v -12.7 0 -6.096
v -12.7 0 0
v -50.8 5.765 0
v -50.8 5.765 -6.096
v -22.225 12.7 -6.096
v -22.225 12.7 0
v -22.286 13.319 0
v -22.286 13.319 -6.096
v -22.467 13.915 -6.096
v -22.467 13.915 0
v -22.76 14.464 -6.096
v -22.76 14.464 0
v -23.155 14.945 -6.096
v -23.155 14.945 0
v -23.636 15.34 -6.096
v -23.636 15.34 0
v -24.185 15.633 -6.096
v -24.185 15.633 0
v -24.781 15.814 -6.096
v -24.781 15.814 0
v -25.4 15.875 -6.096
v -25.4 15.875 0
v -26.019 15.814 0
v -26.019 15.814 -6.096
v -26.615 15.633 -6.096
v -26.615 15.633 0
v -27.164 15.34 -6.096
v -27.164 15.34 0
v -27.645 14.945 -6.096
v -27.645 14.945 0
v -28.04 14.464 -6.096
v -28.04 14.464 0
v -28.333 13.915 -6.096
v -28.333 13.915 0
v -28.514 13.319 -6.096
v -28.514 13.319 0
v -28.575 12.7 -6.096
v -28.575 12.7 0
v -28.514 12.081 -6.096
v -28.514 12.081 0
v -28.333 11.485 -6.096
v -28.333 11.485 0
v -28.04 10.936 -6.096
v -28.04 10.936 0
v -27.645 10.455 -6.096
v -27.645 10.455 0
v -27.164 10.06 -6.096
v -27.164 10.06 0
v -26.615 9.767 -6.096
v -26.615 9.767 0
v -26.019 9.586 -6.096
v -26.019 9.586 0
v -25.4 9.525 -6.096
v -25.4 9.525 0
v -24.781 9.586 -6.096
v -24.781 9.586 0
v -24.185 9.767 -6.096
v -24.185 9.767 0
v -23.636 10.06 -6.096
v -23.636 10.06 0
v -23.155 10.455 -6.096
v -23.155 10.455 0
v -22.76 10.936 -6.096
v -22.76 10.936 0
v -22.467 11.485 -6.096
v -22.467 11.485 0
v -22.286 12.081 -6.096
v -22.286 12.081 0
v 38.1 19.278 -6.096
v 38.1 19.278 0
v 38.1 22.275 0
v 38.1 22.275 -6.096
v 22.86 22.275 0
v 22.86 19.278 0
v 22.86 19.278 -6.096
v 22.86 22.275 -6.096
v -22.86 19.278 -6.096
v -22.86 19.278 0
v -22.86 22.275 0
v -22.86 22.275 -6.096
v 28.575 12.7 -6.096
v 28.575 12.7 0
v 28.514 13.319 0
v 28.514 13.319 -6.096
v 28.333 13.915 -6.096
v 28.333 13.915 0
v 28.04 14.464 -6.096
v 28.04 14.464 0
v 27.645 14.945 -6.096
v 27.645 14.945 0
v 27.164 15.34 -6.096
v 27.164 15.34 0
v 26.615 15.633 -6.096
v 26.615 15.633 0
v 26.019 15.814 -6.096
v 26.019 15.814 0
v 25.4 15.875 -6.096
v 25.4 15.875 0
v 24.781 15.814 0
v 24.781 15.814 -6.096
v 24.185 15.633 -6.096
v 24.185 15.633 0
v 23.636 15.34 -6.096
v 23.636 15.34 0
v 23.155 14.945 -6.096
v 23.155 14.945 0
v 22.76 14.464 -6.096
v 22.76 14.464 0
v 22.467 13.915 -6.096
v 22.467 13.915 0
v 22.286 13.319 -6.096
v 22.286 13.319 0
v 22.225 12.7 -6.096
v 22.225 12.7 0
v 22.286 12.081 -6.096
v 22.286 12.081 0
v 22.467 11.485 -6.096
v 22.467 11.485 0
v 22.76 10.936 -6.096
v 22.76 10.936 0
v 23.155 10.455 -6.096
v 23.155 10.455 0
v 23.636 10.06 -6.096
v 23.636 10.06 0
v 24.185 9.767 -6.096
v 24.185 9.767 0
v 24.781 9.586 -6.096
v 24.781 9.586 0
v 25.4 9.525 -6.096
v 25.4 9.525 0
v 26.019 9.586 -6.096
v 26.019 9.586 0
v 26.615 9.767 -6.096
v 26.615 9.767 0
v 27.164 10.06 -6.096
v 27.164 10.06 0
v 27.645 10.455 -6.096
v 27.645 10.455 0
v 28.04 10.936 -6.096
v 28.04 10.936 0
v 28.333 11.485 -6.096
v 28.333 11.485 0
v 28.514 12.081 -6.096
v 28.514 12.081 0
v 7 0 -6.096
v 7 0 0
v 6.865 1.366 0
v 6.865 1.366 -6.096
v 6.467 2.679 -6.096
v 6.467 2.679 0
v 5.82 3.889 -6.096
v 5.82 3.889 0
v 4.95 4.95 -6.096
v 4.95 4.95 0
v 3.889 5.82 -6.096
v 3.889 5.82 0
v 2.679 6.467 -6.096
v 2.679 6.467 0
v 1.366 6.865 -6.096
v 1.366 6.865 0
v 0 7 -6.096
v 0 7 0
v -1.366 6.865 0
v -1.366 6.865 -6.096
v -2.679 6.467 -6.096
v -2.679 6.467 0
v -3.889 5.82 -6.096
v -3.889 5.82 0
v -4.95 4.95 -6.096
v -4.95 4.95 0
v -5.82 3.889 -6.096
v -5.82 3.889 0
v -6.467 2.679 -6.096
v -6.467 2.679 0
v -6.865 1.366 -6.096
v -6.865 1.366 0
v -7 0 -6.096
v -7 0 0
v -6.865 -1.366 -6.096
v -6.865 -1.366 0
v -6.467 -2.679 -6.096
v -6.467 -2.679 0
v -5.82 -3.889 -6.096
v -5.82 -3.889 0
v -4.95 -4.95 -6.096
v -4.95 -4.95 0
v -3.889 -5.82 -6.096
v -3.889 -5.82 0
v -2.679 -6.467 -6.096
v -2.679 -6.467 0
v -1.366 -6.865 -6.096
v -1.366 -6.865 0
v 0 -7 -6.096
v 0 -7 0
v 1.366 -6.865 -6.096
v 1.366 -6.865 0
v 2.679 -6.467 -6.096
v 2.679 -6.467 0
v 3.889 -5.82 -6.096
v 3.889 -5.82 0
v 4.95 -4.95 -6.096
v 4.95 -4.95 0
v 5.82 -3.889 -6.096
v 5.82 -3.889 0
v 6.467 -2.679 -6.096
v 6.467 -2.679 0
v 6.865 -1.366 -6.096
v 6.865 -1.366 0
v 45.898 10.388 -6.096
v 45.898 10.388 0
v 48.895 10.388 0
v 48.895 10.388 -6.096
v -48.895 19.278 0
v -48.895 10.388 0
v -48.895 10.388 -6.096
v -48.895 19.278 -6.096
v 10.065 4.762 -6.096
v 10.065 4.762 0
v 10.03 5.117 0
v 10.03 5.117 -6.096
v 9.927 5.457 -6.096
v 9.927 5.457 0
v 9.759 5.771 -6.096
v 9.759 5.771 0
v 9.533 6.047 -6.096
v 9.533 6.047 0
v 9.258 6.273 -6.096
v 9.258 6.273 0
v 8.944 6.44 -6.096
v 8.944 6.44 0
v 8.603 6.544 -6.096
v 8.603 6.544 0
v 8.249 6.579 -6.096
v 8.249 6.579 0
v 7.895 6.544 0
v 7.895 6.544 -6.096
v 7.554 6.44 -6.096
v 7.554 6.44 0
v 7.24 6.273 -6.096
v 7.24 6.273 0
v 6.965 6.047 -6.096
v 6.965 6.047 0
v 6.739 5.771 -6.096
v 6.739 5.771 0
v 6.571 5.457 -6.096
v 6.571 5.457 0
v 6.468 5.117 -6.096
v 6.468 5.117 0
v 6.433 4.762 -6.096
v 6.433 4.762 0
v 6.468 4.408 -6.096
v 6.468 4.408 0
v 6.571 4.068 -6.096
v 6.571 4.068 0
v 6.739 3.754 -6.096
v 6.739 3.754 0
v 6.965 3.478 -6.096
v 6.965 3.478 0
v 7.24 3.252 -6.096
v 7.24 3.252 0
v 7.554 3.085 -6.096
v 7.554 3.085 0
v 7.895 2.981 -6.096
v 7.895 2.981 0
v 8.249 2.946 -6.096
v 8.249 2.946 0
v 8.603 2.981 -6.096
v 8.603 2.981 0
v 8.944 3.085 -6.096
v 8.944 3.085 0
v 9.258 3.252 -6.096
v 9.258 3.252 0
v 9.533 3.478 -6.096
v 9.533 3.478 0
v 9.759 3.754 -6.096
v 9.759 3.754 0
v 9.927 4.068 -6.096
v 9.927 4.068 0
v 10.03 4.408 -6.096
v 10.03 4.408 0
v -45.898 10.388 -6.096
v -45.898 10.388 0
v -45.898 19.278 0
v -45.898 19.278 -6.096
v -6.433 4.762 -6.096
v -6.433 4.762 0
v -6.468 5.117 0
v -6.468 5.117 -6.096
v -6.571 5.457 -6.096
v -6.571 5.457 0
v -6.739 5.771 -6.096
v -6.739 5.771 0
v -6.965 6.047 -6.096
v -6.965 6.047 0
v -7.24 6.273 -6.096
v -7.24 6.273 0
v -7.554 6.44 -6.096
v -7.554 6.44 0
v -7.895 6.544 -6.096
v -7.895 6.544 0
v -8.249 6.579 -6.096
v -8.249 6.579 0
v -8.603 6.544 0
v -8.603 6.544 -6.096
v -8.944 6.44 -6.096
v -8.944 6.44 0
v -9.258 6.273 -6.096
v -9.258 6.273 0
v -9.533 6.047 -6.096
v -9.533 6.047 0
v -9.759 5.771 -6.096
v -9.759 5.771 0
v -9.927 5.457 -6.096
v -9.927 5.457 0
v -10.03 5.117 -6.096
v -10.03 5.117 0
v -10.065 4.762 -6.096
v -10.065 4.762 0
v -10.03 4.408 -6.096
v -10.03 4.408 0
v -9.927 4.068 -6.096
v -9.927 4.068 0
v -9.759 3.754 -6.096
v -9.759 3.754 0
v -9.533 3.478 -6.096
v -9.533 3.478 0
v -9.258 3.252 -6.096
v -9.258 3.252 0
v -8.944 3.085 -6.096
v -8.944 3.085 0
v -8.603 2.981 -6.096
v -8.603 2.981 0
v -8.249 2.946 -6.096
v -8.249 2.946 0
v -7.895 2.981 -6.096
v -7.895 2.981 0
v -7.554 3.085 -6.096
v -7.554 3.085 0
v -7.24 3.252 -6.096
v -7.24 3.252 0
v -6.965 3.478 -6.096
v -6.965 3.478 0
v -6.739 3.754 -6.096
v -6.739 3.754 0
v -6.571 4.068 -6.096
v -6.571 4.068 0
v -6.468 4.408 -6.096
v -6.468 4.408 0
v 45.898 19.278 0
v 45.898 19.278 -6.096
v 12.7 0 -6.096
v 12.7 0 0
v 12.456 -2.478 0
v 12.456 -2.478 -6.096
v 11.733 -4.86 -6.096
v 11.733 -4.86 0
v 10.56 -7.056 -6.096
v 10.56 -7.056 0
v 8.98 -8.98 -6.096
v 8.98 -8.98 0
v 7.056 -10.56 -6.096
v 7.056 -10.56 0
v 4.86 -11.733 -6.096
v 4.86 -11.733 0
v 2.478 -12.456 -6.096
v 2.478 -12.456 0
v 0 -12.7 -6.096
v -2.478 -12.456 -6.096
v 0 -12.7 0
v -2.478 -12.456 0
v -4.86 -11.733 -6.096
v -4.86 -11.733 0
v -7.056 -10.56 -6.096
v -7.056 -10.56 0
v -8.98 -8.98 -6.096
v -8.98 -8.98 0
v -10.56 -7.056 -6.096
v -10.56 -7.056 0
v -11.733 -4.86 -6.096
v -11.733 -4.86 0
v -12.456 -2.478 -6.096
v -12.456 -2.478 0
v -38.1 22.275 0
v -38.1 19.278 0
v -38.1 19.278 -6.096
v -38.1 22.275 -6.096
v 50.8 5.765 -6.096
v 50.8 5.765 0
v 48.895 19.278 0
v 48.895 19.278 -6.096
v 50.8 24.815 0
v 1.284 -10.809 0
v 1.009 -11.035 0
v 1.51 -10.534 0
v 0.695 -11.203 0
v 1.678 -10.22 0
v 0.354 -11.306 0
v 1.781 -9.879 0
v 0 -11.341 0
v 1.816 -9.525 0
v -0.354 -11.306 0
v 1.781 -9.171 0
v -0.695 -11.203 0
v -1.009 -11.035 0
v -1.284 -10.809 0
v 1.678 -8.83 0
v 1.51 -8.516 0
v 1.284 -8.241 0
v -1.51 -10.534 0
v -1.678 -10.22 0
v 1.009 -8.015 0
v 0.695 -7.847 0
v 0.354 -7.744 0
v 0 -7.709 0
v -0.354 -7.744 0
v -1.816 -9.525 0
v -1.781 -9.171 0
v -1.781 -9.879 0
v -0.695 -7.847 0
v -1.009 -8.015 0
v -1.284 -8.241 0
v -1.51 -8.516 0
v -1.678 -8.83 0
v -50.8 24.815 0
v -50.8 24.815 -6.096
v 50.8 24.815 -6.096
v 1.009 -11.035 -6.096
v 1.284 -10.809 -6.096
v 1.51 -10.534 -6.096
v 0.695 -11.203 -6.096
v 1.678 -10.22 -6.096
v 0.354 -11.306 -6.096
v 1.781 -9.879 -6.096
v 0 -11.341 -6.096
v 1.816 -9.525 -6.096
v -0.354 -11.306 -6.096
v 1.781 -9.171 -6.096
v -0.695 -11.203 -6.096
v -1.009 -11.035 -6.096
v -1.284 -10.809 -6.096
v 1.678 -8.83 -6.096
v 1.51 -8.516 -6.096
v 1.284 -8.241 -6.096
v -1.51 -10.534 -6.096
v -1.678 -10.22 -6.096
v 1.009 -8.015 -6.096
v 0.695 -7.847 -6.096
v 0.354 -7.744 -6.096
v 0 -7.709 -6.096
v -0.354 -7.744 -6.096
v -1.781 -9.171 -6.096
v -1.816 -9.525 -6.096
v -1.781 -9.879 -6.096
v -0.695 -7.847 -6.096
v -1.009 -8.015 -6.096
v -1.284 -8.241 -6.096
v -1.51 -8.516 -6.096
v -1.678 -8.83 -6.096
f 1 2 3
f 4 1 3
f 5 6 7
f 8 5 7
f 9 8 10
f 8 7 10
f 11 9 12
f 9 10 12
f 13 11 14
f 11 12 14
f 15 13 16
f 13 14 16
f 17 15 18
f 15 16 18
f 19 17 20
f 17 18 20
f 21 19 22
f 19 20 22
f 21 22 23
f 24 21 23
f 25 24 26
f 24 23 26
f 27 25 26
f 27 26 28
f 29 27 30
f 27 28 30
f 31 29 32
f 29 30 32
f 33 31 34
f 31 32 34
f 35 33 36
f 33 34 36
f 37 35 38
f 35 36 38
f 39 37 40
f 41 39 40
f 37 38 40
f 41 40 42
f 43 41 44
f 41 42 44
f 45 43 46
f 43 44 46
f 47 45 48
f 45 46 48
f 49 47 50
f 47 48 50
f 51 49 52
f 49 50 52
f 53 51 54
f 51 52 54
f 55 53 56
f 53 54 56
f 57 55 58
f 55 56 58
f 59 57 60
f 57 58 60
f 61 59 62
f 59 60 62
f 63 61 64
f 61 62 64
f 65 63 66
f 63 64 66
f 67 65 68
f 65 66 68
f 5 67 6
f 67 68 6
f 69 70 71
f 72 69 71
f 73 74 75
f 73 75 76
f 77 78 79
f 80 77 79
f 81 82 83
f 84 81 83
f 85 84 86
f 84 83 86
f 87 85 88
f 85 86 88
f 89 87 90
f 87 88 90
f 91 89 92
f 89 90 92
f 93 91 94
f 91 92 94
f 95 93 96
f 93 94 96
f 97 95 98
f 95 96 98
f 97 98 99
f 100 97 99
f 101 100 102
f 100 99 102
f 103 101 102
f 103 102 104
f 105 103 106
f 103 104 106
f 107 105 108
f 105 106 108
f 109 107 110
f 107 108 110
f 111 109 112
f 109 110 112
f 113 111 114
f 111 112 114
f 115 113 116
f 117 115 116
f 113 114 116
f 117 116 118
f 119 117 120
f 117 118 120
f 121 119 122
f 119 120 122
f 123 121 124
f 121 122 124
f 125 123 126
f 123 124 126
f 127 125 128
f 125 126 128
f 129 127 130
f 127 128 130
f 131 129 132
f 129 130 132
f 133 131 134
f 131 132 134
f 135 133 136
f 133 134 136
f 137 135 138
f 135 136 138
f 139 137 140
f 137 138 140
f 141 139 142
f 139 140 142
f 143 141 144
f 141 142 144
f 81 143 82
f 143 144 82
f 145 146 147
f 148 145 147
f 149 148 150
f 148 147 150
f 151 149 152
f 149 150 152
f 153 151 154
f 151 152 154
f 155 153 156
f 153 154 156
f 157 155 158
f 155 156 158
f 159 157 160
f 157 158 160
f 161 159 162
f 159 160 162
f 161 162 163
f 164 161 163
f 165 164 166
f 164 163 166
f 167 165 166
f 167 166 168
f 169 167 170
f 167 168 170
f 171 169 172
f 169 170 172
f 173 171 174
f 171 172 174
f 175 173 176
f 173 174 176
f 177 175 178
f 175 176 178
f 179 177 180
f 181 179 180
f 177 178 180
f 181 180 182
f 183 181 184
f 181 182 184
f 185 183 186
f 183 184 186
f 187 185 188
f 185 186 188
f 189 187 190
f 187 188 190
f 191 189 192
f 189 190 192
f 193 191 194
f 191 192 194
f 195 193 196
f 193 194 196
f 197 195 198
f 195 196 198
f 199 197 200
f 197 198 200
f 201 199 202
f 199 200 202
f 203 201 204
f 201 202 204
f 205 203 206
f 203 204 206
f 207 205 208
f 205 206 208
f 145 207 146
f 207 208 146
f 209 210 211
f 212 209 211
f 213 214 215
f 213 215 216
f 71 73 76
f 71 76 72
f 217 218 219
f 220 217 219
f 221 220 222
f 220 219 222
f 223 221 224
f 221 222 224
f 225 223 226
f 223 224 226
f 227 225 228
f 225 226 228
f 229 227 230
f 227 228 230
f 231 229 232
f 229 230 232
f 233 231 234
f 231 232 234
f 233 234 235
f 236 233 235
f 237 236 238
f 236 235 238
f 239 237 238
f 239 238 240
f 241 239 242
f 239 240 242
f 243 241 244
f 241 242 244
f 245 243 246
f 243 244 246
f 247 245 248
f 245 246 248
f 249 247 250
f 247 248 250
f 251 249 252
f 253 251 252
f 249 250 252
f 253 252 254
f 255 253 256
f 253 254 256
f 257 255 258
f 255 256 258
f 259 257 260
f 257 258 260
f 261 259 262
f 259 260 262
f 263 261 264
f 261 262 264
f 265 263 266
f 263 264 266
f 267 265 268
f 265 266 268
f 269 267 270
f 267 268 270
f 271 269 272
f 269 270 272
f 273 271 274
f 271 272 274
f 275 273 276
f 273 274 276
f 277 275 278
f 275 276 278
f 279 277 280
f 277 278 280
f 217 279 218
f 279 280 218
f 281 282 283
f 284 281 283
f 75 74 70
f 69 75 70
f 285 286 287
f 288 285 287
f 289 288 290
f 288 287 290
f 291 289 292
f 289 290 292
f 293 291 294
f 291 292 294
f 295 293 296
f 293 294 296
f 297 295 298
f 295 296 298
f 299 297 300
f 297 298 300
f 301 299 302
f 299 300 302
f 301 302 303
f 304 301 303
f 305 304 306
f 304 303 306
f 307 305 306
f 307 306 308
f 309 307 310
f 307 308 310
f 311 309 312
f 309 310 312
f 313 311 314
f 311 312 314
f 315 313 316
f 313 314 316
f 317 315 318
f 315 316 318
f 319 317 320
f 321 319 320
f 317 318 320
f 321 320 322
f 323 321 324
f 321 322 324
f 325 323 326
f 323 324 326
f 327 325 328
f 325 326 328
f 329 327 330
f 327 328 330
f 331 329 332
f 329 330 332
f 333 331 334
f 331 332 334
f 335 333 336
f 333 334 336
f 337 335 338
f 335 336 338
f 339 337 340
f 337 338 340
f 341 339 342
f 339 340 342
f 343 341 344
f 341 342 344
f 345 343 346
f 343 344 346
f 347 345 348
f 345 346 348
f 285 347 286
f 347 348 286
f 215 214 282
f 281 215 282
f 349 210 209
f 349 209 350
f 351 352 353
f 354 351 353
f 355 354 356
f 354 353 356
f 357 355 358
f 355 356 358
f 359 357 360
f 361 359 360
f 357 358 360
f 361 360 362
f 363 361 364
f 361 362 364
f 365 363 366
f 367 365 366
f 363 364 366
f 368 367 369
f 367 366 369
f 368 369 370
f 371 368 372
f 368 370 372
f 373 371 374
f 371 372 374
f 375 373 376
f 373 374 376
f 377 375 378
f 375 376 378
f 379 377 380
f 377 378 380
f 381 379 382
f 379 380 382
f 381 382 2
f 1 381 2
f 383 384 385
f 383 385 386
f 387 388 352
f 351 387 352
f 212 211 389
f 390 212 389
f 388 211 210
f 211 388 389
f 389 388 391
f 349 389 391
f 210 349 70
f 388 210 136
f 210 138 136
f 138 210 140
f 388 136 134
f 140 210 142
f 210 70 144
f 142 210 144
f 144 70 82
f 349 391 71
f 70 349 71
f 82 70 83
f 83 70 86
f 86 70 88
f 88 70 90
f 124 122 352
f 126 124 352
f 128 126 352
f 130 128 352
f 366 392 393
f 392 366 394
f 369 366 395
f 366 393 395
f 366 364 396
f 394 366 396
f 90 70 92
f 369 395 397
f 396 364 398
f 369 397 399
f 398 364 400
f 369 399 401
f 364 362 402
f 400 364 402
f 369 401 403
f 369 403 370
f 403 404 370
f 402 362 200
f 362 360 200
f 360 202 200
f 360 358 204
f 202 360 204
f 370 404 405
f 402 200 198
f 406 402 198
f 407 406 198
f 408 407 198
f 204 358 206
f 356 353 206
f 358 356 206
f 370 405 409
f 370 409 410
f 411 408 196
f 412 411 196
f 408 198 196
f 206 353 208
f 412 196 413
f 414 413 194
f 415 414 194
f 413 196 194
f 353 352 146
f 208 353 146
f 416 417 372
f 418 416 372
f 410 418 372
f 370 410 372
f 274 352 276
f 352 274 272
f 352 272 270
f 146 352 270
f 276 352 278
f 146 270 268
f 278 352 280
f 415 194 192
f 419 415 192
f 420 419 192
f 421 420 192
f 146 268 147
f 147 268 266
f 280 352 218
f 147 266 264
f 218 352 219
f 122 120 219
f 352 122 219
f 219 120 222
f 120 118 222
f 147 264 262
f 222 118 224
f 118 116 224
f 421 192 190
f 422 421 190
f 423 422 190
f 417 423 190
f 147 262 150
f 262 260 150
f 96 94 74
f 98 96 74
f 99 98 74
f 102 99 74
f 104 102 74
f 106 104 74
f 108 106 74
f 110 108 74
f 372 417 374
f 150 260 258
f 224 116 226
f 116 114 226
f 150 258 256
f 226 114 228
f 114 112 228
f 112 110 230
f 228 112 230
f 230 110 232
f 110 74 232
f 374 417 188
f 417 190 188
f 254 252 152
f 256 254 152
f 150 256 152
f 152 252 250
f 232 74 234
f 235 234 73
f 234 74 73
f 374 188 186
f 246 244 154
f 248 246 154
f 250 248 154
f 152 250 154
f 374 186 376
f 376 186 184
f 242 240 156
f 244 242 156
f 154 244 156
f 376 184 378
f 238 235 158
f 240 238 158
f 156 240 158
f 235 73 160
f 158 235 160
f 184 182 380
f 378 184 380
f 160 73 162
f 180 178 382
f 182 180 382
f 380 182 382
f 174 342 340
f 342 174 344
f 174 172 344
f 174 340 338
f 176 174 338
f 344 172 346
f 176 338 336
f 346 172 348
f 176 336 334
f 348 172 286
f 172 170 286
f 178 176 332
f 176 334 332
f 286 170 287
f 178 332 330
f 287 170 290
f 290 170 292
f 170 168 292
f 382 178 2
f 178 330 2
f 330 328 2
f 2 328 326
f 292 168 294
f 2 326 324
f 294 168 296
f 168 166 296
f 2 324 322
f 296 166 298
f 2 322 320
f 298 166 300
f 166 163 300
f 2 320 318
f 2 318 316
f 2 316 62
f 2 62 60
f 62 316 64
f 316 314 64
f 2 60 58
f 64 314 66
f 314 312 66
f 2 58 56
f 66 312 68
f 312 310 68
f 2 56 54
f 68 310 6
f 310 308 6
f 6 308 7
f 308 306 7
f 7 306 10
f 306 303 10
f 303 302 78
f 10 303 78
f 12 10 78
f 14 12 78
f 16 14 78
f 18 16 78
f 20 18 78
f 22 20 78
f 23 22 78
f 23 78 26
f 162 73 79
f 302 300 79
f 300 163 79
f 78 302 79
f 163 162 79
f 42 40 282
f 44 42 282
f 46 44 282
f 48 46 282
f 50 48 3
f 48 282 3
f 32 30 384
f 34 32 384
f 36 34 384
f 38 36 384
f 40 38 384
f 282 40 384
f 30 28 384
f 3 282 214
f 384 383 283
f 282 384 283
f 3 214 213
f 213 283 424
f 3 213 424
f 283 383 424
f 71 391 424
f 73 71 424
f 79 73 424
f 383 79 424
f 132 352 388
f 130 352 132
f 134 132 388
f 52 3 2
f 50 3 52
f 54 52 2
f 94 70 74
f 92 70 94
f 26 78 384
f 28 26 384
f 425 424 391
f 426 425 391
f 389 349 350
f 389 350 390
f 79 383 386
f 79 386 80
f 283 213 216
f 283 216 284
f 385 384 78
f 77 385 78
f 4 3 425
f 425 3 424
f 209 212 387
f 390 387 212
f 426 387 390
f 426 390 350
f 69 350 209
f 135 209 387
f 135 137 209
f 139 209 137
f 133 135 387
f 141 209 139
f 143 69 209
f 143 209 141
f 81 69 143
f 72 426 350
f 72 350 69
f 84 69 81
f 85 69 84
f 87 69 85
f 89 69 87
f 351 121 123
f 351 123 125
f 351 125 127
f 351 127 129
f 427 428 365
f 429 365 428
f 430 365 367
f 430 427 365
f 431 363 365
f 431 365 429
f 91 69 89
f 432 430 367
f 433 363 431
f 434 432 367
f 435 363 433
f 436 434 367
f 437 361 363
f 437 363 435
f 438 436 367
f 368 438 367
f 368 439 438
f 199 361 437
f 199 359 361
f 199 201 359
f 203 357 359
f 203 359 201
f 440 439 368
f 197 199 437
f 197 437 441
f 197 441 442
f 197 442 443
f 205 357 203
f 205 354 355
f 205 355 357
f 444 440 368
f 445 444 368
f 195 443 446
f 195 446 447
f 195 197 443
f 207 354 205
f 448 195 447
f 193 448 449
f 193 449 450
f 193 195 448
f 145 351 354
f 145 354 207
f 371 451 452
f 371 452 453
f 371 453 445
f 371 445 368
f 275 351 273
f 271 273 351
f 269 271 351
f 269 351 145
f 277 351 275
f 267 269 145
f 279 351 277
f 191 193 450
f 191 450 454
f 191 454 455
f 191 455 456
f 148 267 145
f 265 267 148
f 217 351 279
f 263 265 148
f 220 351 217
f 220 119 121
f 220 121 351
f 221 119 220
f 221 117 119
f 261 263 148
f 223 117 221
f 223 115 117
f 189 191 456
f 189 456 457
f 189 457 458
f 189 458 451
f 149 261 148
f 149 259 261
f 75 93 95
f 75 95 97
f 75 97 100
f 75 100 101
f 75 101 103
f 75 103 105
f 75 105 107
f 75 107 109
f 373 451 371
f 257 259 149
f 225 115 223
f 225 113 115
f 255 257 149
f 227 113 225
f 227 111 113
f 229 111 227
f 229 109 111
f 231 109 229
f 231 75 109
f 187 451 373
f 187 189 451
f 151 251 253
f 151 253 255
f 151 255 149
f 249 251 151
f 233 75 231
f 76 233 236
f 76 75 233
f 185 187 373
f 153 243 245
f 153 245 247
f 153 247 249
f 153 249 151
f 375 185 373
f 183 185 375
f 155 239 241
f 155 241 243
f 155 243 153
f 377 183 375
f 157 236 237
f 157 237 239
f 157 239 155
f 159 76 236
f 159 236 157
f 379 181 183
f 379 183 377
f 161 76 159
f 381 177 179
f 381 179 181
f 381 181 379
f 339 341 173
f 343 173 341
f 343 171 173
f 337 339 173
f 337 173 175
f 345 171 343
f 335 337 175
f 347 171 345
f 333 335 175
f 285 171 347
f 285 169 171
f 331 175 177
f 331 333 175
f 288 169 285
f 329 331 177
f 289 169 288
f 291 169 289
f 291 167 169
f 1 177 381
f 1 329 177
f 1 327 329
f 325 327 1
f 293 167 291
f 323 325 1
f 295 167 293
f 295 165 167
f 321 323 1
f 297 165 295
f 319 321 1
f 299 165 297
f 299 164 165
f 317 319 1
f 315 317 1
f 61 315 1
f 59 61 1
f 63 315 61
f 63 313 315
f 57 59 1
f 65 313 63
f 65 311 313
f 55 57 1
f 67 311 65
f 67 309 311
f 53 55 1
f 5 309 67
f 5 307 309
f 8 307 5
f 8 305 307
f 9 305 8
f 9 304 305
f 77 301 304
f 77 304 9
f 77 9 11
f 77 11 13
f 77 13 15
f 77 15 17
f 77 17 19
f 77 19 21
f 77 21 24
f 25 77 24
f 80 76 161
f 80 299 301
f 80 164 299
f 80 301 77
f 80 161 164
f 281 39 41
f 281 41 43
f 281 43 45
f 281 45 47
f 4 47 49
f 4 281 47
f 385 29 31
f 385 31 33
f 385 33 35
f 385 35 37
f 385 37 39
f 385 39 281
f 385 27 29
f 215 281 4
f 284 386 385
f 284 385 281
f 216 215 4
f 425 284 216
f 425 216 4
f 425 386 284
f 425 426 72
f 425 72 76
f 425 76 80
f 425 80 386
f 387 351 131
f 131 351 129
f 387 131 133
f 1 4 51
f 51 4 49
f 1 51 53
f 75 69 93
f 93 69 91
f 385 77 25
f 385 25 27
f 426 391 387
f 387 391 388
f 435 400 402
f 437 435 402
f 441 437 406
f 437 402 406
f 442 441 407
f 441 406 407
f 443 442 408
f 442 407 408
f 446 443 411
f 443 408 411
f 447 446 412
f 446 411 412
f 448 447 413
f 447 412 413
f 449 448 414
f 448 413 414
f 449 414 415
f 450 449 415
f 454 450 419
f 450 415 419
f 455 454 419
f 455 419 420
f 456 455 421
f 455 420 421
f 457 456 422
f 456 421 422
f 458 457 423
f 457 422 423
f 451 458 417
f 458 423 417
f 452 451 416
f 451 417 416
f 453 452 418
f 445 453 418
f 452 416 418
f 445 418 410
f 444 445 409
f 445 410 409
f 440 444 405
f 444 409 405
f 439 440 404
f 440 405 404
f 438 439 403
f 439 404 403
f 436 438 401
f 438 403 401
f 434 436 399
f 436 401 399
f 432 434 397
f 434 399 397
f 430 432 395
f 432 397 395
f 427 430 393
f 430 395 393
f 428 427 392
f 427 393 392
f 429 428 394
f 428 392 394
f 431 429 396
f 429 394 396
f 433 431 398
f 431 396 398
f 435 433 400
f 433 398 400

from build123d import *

# Parameters (mm, degrees)
SKETCH1_R           = 3.175
SKETCH1_R_2         = 1.8161
SKETCH1_R_3         = 7
BOSS_EXTRUDE1_DEPTH = 6.096
SKETCH2_W           = 15.24
SKETCH2_H           = 2.9972
CUT_EXTRUDE1_DEPTH  = 57.86462381
SKETCH3_W           = 2.9972
SKETCH3_H           = 8.89
CUT_EXTRUDE2_DEPTH  = 57.86462381


with BuildPart() as part:
    # Sketch1 → Boss-Extrude1 (new body)
    with BuildSketch(Plane.XY):
        with BuildLine():
            Line((-50.8, 24.815), (50.8, 24.815))
            Line((50.8, 24.815), (50.8, 5.765))
            Line((50.8, 5.765), (12.7, 0))
            ThreePointArc((12.7, 0), (0, -12.7), (-12.7, 0))
            Line((-12.7, 0), (-50.8, 5.765))
            Line((-50.8, 5.765), (-50.8, 24.815))
        make_face()
        with Locations((25.4, 12.7)):
            Circle(SKETCH1_R, mode=Mode.SUBTRACT)
        with Locations((-25.4, 12.7)):
            Circle(SKETCH1_R, mode=Mode.SUBTRACT)
        with Locations((-8.248891971, 4.7625)):
            Circle(SKETCH1_R_2, mode=Mode.SUBTRACT)
        Circle(SKETCH1_R_3, mode=Mode.SUBTRACT)
        with Locations((8.248891971, 4.7625)):
            Circle(SKETCH1_R_2, mode=Mode.SUBTRACT)
        with Locations((0, -9.525)):
            Circle(SKETCH1_R_2, mode=Mode.SUBTRACT)
    extrude(amount=-BOSS_EXTRUDE1_DEPTH)

    # Sketch2 → Cut-Extrude1 (cut, through all)
    with BuildSketch(Plane.XY):
        with Locations((-30.48, 20.7764)):
            Rectangle(SKETCH2_W, SKETCH2_H)
        with Locations((30.48, 20.7764)):
            Rectangle(SKETCH2_W, SKETCH2_H)
    extrude(amount=-CUT_EXTRUDE1_DEPTH, mode=Mode.SUBTRACT)

    # Sketch3 → Cut-Extrude2 (cut, through all)
    with BuildSketch(Plane.XY):
        with Locations((-47.3964, 14.8328)):
            Rectangle(SKETCH3_W, SKETCH3_H)
        with Locations((47.3964, 14.8328)):
            Rectangle(SKETCH3_W, SKETCH3_H)
    extrude(amount=-CUT_EXTRUDE2_DEPTH, mode=Mode.SUBTRACT)


solid = part.part
